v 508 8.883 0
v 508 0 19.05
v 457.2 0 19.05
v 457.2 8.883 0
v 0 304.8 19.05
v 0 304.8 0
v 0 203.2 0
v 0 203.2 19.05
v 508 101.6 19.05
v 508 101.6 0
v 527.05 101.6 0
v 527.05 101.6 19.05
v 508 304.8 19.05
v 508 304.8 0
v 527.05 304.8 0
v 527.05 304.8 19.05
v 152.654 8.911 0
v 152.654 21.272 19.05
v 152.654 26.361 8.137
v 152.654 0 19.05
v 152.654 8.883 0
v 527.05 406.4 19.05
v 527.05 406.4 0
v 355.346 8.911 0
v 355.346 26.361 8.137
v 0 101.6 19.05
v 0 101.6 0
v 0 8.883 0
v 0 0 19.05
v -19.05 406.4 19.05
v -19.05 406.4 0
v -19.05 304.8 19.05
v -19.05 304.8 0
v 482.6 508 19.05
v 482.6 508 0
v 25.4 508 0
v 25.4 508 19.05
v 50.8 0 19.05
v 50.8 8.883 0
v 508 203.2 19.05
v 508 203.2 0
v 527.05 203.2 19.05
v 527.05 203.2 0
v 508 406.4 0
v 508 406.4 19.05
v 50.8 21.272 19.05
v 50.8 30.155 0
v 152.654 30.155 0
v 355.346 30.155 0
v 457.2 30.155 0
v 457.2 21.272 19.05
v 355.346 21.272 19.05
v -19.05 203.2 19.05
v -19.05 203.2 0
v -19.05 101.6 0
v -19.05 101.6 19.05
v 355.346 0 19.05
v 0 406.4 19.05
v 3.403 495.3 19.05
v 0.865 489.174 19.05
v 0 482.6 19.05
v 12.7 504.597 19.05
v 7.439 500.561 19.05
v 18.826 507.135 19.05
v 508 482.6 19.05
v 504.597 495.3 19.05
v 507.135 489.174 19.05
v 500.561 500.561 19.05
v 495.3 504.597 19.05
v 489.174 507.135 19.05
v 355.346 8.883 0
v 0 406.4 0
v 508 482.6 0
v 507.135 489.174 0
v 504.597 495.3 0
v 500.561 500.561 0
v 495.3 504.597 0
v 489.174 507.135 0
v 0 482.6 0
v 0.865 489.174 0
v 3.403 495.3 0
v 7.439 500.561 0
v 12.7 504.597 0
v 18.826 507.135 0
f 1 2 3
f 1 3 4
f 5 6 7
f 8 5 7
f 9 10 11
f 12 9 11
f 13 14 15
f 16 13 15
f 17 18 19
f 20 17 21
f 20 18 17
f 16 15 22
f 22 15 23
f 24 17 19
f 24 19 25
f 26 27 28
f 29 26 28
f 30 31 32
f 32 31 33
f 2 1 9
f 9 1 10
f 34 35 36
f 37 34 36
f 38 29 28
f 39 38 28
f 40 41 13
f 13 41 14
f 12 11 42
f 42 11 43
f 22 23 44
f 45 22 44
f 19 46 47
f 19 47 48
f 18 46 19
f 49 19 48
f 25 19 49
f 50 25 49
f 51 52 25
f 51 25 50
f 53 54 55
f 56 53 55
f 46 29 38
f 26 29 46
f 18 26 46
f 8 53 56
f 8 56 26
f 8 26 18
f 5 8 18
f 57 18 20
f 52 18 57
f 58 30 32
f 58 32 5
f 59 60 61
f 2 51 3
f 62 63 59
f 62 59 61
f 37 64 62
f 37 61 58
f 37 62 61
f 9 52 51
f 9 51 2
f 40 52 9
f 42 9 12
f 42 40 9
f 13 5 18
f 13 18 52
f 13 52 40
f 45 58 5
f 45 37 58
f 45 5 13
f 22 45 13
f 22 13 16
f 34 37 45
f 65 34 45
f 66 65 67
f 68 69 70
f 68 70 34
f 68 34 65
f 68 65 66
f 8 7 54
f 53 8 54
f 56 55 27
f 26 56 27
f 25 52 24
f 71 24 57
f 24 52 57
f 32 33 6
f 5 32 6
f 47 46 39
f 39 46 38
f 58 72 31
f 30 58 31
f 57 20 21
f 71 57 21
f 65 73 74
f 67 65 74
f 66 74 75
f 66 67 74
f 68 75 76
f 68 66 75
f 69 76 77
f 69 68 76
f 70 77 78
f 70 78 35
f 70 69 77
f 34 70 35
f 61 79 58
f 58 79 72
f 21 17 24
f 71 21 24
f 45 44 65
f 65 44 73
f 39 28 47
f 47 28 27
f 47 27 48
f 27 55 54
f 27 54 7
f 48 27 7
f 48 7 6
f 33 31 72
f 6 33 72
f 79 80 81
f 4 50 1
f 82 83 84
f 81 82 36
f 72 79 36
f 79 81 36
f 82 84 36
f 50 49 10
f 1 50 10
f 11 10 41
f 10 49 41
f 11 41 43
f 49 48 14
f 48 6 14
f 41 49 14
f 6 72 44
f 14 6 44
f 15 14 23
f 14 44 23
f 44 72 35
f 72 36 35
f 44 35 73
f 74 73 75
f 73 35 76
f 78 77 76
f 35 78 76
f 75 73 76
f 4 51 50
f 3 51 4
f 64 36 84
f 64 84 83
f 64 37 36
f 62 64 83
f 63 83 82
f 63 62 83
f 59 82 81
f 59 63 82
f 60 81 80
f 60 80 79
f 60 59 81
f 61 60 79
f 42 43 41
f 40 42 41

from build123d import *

# Parameters (mm, degrees)
F1_DEPTH  = 19.05
F2_R      = 25.4
F4_DEPTH  = 527.051
F6_W      = 101.854
F6_H      = 19.2786
F7_DEPTH  = 231.9562403073
F9_W      = 202.692
F9_H      = 19.2786
F10_DEPTH = 210.9250403073


with BuildPart() as f1:
    # F0 (on Top) → F1 (new body)
    with BuildSketch(Plane.XY):
        Polygon((0, 101.6), (0, 0), (508, 0), (508, 101.6), (527.05, 101.6), (527.05, 152.4), (527.05, 203.2), (508, 203.2), (508, 304.8), (527.05, 304.8), (527.05, 355.6), (527.05, 406.4), (508, 406.4), (508, 508), (254, 508), (0, 508), (0, 406.4), (-19.05, 406.4), (-19.05, 355.6), (-19.05, 304.8), (0, 304.8), (0, 203.2), (-19.05, 203.2), (-19.05, 152.4), (-19.05, 101.6), align=None)
    extrude(amount=F1_DEPTH)

    # F2
    f2_edges = [f1.edges().sort_by_distance(p)[0] for p in [
        (0, 508, 9.525),
        (508, 508, 9.525),
    ]]
    fillet(f2_edges, radius=F2_R)

    # F3 (on face) → F4 (cut, through all)
    with BuildSketch(Plane(origin=(0, 0, 0), x_dir=(0, -1, 0), z_dir=(-1, 0, 0))):
        Polygon((0, 0), (0, 19.05), (-8.8831608879, 0), align=None)
    extrude(amount=-F4_DEPTH, mode=Mode.SUBTRACT)

    # F6 (on face) → F7 (cut, through all)
    with BuildSketch(Plane(origin=(0, -7.2965733207, 15.6475519823), x_dir=(1, 0, 0), z_dir=(0, 0.4226182617, -0.906307787))):
        with Locations((101.727, -17.6901778862)):
            Rectangle(F6_W, F6_H)
        with Locations((406.273, -17.6901778862)):
            Rectangle(F6_W, F6_H)
    extrude(amount=F7_DEPTH, mode=Mode.SUBTRACT)

    # F9 (on face) → F10 (cut, through all)
    with BuildSketch(Plane(origin=(0, 1.5915958656, -3.4131883485), x_dir=(1, 0, 0), z_dir=(0, 0.4226182617, -0.906307787))):
        with Locations((254, -17.6901778862)):
            Rectangle(F9_W, F9_H)
    extrude(amount=F10_DEPTH, mode=Mode.SUBTRACT)


solid = f1.part
